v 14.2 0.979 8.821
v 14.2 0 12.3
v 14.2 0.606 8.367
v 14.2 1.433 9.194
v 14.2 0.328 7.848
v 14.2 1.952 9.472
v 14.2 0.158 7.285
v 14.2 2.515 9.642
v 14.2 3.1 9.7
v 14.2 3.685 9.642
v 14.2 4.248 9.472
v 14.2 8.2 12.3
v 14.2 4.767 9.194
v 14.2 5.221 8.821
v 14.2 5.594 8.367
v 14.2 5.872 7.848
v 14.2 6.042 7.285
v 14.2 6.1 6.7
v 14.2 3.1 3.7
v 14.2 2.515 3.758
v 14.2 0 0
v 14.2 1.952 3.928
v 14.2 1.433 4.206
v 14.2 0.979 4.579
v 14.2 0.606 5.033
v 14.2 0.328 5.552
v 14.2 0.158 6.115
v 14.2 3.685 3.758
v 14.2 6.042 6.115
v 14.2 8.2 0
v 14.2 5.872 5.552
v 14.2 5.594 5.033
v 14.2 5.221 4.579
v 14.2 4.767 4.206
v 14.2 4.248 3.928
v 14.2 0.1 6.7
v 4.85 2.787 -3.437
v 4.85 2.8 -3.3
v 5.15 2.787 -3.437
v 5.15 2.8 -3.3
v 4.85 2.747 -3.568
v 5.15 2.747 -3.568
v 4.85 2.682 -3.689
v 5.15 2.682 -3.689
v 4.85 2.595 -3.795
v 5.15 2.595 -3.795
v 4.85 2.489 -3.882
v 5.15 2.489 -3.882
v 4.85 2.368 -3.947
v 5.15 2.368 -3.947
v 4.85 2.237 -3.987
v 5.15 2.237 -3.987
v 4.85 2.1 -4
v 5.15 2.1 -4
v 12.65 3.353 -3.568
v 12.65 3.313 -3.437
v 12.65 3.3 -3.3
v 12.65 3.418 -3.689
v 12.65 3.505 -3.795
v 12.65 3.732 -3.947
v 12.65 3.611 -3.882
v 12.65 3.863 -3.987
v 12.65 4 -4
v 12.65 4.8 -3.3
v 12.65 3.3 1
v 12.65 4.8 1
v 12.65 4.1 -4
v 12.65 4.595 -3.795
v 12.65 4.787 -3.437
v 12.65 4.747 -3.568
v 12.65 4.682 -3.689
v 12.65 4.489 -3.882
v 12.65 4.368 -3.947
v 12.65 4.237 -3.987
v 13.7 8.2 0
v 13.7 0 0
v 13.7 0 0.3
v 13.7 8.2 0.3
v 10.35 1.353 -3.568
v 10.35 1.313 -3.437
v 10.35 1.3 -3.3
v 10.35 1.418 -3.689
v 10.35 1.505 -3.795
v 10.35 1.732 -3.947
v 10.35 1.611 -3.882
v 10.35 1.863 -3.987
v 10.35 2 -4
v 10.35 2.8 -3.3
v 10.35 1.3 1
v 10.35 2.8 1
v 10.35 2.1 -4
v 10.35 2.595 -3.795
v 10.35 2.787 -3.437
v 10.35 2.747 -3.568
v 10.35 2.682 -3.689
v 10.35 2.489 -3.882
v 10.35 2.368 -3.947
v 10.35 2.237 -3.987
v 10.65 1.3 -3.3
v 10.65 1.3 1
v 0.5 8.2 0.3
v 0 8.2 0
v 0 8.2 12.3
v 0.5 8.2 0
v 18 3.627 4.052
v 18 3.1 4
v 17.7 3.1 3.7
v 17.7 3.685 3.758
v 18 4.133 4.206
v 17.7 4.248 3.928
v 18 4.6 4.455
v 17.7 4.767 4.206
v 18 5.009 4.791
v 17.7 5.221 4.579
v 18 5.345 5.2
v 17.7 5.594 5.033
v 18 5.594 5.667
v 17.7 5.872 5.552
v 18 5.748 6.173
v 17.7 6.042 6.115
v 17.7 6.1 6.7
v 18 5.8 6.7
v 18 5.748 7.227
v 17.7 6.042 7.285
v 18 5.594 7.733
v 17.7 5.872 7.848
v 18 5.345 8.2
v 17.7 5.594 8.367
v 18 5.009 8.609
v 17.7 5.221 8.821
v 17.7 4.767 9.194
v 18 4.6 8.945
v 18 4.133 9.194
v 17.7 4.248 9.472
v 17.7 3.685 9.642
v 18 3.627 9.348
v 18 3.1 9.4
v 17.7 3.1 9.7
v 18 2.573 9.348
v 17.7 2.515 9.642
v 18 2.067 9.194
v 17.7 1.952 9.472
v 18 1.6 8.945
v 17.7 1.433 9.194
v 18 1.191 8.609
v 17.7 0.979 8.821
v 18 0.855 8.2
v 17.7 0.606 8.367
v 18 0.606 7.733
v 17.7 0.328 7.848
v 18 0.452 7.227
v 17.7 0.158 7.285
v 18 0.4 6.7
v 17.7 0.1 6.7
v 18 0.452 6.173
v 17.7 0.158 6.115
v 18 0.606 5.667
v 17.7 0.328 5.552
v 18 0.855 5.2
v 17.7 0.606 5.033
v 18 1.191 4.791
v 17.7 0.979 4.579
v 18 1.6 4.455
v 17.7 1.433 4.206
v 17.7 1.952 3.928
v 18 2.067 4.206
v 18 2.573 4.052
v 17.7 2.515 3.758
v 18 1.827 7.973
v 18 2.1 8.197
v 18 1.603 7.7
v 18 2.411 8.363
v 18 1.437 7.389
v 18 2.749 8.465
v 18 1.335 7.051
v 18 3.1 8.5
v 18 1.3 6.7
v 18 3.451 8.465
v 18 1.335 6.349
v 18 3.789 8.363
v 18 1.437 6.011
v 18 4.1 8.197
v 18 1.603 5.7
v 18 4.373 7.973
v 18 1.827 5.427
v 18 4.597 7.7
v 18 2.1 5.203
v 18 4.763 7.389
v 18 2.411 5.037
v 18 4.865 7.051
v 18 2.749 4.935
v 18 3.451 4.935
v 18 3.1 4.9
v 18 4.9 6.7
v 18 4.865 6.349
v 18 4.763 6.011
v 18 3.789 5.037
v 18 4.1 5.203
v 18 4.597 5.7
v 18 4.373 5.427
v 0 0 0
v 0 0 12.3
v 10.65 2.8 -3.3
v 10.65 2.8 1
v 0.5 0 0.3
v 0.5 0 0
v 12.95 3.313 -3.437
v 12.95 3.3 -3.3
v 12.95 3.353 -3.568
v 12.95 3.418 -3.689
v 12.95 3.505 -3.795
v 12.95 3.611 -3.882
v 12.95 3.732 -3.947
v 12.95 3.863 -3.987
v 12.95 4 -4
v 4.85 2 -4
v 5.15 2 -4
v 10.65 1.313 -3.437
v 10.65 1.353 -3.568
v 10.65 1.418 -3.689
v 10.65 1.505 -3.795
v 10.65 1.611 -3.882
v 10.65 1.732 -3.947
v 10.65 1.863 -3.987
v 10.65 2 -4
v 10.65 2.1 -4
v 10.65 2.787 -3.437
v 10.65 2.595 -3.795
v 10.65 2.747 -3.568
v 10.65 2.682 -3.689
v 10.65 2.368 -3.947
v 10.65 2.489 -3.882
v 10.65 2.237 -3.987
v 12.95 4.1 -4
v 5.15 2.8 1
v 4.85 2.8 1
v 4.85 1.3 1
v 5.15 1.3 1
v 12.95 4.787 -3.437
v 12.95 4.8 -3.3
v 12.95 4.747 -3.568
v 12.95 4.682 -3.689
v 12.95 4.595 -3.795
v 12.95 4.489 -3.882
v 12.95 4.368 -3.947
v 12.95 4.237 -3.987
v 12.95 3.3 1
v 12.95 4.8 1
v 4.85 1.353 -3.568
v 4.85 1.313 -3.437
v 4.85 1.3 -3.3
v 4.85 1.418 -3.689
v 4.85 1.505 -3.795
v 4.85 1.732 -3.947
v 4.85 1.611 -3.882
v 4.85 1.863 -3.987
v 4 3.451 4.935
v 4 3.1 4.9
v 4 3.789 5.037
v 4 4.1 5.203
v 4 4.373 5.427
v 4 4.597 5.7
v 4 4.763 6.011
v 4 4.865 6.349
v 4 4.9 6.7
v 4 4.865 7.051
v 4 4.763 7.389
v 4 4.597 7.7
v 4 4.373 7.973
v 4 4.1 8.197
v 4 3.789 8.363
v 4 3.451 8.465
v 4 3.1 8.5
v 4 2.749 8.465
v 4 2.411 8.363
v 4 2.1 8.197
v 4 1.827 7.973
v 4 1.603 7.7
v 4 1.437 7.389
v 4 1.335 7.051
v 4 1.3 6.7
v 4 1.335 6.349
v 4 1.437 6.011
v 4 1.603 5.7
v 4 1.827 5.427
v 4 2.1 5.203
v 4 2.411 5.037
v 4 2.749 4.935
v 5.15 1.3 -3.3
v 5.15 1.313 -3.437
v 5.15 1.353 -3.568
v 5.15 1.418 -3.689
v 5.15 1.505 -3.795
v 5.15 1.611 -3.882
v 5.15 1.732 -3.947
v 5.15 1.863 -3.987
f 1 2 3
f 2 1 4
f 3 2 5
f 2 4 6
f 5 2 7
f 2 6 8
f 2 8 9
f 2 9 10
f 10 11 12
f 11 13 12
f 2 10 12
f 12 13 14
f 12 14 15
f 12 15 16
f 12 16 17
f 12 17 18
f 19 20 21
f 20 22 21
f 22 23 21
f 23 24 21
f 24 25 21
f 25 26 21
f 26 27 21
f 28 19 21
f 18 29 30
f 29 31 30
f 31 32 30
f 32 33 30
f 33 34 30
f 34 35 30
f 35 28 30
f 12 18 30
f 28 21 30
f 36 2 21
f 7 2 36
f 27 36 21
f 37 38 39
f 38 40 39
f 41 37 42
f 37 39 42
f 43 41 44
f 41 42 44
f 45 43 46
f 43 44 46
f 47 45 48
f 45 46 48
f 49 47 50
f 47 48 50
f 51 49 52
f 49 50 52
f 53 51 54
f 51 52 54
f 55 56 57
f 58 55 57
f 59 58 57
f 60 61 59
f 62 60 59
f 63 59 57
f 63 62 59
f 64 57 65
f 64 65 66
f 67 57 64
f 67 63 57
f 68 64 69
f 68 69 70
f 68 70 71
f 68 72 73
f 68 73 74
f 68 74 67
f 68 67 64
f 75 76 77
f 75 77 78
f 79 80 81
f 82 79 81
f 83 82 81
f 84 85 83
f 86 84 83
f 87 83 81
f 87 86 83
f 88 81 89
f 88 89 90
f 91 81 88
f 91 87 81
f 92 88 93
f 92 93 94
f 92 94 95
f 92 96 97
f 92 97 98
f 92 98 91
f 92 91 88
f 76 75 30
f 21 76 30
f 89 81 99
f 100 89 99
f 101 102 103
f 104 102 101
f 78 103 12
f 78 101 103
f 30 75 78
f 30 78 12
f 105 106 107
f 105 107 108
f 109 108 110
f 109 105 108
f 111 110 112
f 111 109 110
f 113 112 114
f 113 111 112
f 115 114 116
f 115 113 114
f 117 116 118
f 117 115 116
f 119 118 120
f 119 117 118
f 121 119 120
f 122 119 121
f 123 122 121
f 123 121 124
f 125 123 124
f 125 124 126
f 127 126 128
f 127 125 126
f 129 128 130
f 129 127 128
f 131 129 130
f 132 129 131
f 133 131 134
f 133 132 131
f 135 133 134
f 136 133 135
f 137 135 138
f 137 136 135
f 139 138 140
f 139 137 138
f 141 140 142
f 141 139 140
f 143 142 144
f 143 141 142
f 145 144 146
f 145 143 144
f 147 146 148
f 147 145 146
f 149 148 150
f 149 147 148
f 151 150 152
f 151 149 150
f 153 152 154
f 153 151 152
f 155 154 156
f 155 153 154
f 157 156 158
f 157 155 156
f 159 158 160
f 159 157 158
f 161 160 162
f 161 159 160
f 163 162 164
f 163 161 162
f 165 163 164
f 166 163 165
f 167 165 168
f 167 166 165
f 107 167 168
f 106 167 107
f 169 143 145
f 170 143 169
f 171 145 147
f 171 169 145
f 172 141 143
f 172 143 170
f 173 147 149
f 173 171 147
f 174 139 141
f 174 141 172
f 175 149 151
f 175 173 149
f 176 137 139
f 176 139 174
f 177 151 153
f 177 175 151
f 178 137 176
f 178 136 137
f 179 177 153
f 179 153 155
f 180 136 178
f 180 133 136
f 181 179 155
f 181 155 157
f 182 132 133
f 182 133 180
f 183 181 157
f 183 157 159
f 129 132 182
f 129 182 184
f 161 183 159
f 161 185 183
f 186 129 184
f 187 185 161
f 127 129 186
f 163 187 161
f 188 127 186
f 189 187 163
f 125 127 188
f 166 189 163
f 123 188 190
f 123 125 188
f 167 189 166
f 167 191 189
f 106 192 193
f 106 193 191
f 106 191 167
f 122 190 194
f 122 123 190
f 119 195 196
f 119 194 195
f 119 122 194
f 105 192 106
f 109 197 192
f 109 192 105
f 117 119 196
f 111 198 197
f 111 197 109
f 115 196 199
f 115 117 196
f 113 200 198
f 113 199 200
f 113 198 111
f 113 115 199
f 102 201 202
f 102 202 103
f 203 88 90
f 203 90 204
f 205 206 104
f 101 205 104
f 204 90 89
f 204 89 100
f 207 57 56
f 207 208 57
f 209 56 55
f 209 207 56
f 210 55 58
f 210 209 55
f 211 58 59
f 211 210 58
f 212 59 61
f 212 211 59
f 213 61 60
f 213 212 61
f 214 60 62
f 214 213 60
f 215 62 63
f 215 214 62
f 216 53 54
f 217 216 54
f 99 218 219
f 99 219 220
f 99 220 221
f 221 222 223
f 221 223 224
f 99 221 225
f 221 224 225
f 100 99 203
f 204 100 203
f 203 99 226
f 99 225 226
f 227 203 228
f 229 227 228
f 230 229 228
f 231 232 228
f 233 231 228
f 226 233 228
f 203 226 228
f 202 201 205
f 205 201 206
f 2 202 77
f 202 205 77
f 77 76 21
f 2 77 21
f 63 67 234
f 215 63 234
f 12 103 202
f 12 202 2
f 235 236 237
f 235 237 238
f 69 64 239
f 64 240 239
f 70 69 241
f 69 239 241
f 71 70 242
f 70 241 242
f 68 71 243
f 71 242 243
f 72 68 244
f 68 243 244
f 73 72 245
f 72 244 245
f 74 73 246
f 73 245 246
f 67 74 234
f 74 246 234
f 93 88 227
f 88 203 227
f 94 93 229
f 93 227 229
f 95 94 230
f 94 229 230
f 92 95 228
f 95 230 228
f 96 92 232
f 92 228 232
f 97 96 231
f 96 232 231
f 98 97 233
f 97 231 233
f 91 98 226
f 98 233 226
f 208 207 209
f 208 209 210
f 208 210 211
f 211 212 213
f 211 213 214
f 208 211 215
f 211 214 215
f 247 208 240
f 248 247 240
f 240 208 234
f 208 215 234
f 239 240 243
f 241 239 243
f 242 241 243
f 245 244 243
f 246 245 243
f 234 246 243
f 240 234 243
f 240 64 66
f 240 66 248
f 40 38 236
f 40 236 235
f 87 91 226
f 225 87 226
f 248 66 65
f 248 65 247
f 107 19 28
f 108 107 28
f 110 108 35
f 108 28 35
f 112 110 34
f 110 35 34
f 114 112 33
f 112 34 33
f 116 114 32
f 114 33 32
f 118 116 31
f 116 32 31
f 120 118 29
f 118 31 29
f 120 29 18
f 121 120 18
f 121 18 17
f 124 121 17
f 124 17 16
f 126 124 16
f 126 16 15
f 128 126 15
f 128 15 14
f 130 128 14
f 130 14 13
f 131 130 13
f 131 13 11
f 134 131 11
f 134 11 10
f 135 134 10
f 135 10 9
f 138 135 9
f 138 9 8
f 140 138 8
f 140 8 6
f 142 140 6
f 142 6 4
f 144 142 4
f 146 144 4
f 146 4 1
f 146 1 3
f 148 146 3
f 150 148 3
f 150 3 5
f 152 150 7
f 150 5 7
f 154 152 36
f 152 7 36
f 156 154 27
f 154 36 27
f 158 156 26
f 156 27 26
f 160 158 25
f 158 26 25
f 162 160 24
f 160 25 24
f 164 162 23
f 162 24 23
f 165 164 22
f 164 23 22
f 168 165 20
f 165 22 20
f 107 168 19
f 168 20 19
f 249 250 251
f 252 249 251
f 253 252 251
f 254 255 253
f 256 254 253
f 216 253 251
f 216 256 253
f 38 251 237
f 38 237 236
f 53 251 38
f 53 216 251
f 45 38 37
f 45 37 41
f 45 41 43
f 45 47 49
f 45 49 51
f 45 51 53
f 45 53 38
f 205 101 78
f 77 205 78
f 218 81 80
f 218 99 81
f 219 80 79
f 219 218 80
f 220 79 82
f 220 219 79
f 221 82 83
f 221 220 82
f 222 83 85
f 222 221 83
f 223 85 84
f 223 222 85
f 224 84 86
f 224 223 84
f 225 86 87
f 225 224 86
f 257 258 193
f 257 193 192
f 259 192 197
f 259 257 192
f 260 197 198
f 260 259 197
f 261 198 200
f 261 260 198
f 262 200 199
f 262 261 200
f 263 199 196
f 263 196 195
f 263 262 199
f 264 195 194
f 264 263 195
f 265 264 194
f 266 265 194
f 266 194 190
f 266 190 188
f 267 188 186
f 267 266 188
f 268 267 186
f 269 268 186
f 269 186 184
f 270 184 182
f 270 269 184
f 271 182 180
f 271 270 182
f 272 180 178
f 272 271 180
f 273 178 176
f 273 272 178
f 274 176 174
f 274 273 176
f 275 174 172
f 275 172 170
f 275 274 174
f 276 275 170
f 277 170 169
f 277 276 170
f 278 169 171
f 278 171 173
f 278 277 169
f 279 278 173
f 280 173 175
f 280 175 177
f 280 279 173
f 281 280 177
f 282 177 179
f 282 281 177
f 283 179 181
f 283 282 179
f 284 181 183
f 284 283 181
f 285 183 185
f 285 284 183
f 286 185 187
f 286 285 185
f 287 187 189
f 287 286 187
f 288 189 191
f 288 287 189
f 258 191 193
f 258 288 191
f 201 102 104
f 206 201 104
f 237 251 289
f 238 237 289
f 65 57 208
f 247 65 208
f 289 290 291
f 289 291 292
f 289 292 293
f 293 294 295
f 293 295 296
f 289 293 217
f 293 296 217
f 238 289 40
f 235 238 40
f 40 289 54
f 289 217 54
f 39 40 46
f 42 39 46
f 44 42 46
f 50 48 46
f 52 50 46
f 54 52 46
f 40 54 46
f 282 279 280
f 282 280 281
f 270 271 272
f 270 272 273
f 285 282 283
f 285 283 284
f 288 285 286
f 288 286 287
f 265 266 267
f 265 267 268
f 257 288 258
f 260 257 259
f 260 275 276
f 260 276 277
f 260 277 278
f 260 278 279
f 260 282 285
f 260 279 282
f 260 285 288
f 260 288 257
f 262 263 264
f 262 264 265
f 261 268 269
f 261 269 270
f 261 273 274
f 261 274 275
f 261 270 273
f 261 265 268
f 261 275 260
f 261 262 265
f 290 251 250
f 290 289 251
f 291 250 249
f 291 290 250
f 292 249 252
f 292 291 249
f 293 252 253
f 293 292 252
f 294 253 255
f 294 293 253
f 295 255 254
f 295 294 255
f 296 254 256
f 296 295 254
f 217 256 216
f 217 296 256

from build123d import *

# Parameters (mm, degrees)
BOX002_W                = 0.3
BOX002_H                = 1.5
BOX002_DEPTH            = 5
FILLET_R                = 0.7
FILLET001_R             = 0.7
FILLET002_R             = 0.7
BOX001_W                = 13.2
BOX001_H                = 8.2
BOX001_DEPTH            = 12.3
CYLINDER001_R           = 1.8
CYLINDER001_DEPTH       = 14
CYLINDER001_PITCH_ANGLE = 90
CYLINDER_R              = 3
CYLINDER_DEPTH          = 4
CYLINDER_PITCH_ANGLE    = 90
BOX_W                   = 14.2
BOX_H                   = 8.2
BOX_DEPTH               = 12.3
CHAMFER_SIZE            = 0.3


with BuildPart() as cube001:
    # Box002 → Box002 (new body)
    with BuildSketch(Plane(origin=(12.65, 3.3, -4), x_dir=(1, 0, 0), z_dir=(0, 0, 1))):
        with Locations((0.15, 0.75)):
            Rectangle(BOX002_W, BOX002_H)
    extrude(amount=BOX002_DEPTH)


with BuildPart() as terminal1:
    # Fillet base: copy of Cube001
    add(cube001.part)

    # Fillet
    fillet_edges = [terminal1.edges().sort_by_distance(p)[0] for p in [
        (12.8, 3.3, -4),
        (12.8, 4.8, -4),
    ]]
    fillet(fillet_edges, radius=FILLET_R)


with BuildPart() as terminal2:
    # Fillet001 base: copy of Cube001
    add(cube001.part)

    # Fillet001
    fillet001_edges = [terminal2.edges().sort_by_distance(p)[0] for p in [
        (12.8, 3.3, -4),
        (12.8, 4.8, -4),
    ]]
    fillet(fillet001_edges, radius=FILLET001_R)


with BuildPart() as terminal2_1:
    # Fillet001 placement: moved
    add(terminal2.part.moved(Location((-2.3, -2, 0))))


with BuildPart() as terminal3:
    # Fillet002 base: copy of Cube001
    add(cube001.part)

    # Fillet002
    fillet002_edges = [terminal3.edges().sort_by_distance(p)[0] for p in [
        (12.8, 3.3, -4),
        (12.8, 4.8, -4),
    ]]
    fillet(fillet002_edges, radius=FILLET002_R)


with BuildPart() as terminal3_1:
    # Fillet002 placement: moved
    add(terminal3.part.moved(Location((-7.8, -2, 0))))


with BuildPart() as cube:
    # Box001 → Box001 (new body)
    with BuildSketch(Plane(origin=(0.5, 0, -12), x_dir=(1, 0, 0), z_dir=(0, 0, 1))):
        with Locations((6.6, 4.1)):
            Rectangle(BOX001_W, BOX001_H)
    extrude(amount=BOX001_DEPTH)


with BuildPart() as fusion:
    # Cylinder001 → Cylinder001 (new body)
    with BuildSketch(Plane.XY):
        Circle(CYLINDER001_R)
    extrude(amount=CYLINDER001_DEPTH)


with BuildPart() as fusion_1:
    # Cylinder001 pitch: moved
    add(fusion.part.rotate(Axis((0, 0, 0), (0, 1, 0)), CYLINDER001_PITCH_ANGLE))


with BuildPart() as fusion_2:
    # Cylinder001 placement: moved
    add(fusion_1.part.moved(Location((4, 3.1, 6.7))))

    # Fusion: union Cube-
    add(cube.part)


with BuildPart() as cylinder:
    # Cylinder → Cylinder (new body)
    with BuildSketch(Plane.XY):
        Circle(CYLINDER_R)
    extrude(amount=CYLINDER_DEPTH)


with BuildPart() as cylinder_1:
    # Cylinder pitch: moved
    add(cylinder.part.rotate(Axis((0, 0, 0), (0, 1, 0)), CYLINDER_PITCH_ANGLE))


with BuildPart() as cylinder_2:
    # Cylinder placement: moved
    add(cylinder_1.part.moved(Location((14, 3.1, 6.7))))


with BuildPart() as chamfer_body:
    # Box → Box (new body)
    with BuildSketch(Plane.XY):
        with Locations((7.1, 4.1)):
            Rectangle(BOX_W, BOX_H)
    extrude(amount=BOX_DEPTH)

    # Fusion001: union Cylinder
    add(cylinder_2.part)

    # Cut: cut Fusion-
    add(fusion_2.part, mode=Mode.SUBTRACT)

    # Chamfer
    chamfer_edges = [chamfer_body.edges().sort_by_distance(p)[0] for p in [
        (18, 3.1, 9.7),
    ]]
    chamfer(chamfer_edges, length=CHAMFER_SIZE)


solid = Compound([terminal1.part, terminal2_1.part, terminal3_1.part, chamfer_body.part])
